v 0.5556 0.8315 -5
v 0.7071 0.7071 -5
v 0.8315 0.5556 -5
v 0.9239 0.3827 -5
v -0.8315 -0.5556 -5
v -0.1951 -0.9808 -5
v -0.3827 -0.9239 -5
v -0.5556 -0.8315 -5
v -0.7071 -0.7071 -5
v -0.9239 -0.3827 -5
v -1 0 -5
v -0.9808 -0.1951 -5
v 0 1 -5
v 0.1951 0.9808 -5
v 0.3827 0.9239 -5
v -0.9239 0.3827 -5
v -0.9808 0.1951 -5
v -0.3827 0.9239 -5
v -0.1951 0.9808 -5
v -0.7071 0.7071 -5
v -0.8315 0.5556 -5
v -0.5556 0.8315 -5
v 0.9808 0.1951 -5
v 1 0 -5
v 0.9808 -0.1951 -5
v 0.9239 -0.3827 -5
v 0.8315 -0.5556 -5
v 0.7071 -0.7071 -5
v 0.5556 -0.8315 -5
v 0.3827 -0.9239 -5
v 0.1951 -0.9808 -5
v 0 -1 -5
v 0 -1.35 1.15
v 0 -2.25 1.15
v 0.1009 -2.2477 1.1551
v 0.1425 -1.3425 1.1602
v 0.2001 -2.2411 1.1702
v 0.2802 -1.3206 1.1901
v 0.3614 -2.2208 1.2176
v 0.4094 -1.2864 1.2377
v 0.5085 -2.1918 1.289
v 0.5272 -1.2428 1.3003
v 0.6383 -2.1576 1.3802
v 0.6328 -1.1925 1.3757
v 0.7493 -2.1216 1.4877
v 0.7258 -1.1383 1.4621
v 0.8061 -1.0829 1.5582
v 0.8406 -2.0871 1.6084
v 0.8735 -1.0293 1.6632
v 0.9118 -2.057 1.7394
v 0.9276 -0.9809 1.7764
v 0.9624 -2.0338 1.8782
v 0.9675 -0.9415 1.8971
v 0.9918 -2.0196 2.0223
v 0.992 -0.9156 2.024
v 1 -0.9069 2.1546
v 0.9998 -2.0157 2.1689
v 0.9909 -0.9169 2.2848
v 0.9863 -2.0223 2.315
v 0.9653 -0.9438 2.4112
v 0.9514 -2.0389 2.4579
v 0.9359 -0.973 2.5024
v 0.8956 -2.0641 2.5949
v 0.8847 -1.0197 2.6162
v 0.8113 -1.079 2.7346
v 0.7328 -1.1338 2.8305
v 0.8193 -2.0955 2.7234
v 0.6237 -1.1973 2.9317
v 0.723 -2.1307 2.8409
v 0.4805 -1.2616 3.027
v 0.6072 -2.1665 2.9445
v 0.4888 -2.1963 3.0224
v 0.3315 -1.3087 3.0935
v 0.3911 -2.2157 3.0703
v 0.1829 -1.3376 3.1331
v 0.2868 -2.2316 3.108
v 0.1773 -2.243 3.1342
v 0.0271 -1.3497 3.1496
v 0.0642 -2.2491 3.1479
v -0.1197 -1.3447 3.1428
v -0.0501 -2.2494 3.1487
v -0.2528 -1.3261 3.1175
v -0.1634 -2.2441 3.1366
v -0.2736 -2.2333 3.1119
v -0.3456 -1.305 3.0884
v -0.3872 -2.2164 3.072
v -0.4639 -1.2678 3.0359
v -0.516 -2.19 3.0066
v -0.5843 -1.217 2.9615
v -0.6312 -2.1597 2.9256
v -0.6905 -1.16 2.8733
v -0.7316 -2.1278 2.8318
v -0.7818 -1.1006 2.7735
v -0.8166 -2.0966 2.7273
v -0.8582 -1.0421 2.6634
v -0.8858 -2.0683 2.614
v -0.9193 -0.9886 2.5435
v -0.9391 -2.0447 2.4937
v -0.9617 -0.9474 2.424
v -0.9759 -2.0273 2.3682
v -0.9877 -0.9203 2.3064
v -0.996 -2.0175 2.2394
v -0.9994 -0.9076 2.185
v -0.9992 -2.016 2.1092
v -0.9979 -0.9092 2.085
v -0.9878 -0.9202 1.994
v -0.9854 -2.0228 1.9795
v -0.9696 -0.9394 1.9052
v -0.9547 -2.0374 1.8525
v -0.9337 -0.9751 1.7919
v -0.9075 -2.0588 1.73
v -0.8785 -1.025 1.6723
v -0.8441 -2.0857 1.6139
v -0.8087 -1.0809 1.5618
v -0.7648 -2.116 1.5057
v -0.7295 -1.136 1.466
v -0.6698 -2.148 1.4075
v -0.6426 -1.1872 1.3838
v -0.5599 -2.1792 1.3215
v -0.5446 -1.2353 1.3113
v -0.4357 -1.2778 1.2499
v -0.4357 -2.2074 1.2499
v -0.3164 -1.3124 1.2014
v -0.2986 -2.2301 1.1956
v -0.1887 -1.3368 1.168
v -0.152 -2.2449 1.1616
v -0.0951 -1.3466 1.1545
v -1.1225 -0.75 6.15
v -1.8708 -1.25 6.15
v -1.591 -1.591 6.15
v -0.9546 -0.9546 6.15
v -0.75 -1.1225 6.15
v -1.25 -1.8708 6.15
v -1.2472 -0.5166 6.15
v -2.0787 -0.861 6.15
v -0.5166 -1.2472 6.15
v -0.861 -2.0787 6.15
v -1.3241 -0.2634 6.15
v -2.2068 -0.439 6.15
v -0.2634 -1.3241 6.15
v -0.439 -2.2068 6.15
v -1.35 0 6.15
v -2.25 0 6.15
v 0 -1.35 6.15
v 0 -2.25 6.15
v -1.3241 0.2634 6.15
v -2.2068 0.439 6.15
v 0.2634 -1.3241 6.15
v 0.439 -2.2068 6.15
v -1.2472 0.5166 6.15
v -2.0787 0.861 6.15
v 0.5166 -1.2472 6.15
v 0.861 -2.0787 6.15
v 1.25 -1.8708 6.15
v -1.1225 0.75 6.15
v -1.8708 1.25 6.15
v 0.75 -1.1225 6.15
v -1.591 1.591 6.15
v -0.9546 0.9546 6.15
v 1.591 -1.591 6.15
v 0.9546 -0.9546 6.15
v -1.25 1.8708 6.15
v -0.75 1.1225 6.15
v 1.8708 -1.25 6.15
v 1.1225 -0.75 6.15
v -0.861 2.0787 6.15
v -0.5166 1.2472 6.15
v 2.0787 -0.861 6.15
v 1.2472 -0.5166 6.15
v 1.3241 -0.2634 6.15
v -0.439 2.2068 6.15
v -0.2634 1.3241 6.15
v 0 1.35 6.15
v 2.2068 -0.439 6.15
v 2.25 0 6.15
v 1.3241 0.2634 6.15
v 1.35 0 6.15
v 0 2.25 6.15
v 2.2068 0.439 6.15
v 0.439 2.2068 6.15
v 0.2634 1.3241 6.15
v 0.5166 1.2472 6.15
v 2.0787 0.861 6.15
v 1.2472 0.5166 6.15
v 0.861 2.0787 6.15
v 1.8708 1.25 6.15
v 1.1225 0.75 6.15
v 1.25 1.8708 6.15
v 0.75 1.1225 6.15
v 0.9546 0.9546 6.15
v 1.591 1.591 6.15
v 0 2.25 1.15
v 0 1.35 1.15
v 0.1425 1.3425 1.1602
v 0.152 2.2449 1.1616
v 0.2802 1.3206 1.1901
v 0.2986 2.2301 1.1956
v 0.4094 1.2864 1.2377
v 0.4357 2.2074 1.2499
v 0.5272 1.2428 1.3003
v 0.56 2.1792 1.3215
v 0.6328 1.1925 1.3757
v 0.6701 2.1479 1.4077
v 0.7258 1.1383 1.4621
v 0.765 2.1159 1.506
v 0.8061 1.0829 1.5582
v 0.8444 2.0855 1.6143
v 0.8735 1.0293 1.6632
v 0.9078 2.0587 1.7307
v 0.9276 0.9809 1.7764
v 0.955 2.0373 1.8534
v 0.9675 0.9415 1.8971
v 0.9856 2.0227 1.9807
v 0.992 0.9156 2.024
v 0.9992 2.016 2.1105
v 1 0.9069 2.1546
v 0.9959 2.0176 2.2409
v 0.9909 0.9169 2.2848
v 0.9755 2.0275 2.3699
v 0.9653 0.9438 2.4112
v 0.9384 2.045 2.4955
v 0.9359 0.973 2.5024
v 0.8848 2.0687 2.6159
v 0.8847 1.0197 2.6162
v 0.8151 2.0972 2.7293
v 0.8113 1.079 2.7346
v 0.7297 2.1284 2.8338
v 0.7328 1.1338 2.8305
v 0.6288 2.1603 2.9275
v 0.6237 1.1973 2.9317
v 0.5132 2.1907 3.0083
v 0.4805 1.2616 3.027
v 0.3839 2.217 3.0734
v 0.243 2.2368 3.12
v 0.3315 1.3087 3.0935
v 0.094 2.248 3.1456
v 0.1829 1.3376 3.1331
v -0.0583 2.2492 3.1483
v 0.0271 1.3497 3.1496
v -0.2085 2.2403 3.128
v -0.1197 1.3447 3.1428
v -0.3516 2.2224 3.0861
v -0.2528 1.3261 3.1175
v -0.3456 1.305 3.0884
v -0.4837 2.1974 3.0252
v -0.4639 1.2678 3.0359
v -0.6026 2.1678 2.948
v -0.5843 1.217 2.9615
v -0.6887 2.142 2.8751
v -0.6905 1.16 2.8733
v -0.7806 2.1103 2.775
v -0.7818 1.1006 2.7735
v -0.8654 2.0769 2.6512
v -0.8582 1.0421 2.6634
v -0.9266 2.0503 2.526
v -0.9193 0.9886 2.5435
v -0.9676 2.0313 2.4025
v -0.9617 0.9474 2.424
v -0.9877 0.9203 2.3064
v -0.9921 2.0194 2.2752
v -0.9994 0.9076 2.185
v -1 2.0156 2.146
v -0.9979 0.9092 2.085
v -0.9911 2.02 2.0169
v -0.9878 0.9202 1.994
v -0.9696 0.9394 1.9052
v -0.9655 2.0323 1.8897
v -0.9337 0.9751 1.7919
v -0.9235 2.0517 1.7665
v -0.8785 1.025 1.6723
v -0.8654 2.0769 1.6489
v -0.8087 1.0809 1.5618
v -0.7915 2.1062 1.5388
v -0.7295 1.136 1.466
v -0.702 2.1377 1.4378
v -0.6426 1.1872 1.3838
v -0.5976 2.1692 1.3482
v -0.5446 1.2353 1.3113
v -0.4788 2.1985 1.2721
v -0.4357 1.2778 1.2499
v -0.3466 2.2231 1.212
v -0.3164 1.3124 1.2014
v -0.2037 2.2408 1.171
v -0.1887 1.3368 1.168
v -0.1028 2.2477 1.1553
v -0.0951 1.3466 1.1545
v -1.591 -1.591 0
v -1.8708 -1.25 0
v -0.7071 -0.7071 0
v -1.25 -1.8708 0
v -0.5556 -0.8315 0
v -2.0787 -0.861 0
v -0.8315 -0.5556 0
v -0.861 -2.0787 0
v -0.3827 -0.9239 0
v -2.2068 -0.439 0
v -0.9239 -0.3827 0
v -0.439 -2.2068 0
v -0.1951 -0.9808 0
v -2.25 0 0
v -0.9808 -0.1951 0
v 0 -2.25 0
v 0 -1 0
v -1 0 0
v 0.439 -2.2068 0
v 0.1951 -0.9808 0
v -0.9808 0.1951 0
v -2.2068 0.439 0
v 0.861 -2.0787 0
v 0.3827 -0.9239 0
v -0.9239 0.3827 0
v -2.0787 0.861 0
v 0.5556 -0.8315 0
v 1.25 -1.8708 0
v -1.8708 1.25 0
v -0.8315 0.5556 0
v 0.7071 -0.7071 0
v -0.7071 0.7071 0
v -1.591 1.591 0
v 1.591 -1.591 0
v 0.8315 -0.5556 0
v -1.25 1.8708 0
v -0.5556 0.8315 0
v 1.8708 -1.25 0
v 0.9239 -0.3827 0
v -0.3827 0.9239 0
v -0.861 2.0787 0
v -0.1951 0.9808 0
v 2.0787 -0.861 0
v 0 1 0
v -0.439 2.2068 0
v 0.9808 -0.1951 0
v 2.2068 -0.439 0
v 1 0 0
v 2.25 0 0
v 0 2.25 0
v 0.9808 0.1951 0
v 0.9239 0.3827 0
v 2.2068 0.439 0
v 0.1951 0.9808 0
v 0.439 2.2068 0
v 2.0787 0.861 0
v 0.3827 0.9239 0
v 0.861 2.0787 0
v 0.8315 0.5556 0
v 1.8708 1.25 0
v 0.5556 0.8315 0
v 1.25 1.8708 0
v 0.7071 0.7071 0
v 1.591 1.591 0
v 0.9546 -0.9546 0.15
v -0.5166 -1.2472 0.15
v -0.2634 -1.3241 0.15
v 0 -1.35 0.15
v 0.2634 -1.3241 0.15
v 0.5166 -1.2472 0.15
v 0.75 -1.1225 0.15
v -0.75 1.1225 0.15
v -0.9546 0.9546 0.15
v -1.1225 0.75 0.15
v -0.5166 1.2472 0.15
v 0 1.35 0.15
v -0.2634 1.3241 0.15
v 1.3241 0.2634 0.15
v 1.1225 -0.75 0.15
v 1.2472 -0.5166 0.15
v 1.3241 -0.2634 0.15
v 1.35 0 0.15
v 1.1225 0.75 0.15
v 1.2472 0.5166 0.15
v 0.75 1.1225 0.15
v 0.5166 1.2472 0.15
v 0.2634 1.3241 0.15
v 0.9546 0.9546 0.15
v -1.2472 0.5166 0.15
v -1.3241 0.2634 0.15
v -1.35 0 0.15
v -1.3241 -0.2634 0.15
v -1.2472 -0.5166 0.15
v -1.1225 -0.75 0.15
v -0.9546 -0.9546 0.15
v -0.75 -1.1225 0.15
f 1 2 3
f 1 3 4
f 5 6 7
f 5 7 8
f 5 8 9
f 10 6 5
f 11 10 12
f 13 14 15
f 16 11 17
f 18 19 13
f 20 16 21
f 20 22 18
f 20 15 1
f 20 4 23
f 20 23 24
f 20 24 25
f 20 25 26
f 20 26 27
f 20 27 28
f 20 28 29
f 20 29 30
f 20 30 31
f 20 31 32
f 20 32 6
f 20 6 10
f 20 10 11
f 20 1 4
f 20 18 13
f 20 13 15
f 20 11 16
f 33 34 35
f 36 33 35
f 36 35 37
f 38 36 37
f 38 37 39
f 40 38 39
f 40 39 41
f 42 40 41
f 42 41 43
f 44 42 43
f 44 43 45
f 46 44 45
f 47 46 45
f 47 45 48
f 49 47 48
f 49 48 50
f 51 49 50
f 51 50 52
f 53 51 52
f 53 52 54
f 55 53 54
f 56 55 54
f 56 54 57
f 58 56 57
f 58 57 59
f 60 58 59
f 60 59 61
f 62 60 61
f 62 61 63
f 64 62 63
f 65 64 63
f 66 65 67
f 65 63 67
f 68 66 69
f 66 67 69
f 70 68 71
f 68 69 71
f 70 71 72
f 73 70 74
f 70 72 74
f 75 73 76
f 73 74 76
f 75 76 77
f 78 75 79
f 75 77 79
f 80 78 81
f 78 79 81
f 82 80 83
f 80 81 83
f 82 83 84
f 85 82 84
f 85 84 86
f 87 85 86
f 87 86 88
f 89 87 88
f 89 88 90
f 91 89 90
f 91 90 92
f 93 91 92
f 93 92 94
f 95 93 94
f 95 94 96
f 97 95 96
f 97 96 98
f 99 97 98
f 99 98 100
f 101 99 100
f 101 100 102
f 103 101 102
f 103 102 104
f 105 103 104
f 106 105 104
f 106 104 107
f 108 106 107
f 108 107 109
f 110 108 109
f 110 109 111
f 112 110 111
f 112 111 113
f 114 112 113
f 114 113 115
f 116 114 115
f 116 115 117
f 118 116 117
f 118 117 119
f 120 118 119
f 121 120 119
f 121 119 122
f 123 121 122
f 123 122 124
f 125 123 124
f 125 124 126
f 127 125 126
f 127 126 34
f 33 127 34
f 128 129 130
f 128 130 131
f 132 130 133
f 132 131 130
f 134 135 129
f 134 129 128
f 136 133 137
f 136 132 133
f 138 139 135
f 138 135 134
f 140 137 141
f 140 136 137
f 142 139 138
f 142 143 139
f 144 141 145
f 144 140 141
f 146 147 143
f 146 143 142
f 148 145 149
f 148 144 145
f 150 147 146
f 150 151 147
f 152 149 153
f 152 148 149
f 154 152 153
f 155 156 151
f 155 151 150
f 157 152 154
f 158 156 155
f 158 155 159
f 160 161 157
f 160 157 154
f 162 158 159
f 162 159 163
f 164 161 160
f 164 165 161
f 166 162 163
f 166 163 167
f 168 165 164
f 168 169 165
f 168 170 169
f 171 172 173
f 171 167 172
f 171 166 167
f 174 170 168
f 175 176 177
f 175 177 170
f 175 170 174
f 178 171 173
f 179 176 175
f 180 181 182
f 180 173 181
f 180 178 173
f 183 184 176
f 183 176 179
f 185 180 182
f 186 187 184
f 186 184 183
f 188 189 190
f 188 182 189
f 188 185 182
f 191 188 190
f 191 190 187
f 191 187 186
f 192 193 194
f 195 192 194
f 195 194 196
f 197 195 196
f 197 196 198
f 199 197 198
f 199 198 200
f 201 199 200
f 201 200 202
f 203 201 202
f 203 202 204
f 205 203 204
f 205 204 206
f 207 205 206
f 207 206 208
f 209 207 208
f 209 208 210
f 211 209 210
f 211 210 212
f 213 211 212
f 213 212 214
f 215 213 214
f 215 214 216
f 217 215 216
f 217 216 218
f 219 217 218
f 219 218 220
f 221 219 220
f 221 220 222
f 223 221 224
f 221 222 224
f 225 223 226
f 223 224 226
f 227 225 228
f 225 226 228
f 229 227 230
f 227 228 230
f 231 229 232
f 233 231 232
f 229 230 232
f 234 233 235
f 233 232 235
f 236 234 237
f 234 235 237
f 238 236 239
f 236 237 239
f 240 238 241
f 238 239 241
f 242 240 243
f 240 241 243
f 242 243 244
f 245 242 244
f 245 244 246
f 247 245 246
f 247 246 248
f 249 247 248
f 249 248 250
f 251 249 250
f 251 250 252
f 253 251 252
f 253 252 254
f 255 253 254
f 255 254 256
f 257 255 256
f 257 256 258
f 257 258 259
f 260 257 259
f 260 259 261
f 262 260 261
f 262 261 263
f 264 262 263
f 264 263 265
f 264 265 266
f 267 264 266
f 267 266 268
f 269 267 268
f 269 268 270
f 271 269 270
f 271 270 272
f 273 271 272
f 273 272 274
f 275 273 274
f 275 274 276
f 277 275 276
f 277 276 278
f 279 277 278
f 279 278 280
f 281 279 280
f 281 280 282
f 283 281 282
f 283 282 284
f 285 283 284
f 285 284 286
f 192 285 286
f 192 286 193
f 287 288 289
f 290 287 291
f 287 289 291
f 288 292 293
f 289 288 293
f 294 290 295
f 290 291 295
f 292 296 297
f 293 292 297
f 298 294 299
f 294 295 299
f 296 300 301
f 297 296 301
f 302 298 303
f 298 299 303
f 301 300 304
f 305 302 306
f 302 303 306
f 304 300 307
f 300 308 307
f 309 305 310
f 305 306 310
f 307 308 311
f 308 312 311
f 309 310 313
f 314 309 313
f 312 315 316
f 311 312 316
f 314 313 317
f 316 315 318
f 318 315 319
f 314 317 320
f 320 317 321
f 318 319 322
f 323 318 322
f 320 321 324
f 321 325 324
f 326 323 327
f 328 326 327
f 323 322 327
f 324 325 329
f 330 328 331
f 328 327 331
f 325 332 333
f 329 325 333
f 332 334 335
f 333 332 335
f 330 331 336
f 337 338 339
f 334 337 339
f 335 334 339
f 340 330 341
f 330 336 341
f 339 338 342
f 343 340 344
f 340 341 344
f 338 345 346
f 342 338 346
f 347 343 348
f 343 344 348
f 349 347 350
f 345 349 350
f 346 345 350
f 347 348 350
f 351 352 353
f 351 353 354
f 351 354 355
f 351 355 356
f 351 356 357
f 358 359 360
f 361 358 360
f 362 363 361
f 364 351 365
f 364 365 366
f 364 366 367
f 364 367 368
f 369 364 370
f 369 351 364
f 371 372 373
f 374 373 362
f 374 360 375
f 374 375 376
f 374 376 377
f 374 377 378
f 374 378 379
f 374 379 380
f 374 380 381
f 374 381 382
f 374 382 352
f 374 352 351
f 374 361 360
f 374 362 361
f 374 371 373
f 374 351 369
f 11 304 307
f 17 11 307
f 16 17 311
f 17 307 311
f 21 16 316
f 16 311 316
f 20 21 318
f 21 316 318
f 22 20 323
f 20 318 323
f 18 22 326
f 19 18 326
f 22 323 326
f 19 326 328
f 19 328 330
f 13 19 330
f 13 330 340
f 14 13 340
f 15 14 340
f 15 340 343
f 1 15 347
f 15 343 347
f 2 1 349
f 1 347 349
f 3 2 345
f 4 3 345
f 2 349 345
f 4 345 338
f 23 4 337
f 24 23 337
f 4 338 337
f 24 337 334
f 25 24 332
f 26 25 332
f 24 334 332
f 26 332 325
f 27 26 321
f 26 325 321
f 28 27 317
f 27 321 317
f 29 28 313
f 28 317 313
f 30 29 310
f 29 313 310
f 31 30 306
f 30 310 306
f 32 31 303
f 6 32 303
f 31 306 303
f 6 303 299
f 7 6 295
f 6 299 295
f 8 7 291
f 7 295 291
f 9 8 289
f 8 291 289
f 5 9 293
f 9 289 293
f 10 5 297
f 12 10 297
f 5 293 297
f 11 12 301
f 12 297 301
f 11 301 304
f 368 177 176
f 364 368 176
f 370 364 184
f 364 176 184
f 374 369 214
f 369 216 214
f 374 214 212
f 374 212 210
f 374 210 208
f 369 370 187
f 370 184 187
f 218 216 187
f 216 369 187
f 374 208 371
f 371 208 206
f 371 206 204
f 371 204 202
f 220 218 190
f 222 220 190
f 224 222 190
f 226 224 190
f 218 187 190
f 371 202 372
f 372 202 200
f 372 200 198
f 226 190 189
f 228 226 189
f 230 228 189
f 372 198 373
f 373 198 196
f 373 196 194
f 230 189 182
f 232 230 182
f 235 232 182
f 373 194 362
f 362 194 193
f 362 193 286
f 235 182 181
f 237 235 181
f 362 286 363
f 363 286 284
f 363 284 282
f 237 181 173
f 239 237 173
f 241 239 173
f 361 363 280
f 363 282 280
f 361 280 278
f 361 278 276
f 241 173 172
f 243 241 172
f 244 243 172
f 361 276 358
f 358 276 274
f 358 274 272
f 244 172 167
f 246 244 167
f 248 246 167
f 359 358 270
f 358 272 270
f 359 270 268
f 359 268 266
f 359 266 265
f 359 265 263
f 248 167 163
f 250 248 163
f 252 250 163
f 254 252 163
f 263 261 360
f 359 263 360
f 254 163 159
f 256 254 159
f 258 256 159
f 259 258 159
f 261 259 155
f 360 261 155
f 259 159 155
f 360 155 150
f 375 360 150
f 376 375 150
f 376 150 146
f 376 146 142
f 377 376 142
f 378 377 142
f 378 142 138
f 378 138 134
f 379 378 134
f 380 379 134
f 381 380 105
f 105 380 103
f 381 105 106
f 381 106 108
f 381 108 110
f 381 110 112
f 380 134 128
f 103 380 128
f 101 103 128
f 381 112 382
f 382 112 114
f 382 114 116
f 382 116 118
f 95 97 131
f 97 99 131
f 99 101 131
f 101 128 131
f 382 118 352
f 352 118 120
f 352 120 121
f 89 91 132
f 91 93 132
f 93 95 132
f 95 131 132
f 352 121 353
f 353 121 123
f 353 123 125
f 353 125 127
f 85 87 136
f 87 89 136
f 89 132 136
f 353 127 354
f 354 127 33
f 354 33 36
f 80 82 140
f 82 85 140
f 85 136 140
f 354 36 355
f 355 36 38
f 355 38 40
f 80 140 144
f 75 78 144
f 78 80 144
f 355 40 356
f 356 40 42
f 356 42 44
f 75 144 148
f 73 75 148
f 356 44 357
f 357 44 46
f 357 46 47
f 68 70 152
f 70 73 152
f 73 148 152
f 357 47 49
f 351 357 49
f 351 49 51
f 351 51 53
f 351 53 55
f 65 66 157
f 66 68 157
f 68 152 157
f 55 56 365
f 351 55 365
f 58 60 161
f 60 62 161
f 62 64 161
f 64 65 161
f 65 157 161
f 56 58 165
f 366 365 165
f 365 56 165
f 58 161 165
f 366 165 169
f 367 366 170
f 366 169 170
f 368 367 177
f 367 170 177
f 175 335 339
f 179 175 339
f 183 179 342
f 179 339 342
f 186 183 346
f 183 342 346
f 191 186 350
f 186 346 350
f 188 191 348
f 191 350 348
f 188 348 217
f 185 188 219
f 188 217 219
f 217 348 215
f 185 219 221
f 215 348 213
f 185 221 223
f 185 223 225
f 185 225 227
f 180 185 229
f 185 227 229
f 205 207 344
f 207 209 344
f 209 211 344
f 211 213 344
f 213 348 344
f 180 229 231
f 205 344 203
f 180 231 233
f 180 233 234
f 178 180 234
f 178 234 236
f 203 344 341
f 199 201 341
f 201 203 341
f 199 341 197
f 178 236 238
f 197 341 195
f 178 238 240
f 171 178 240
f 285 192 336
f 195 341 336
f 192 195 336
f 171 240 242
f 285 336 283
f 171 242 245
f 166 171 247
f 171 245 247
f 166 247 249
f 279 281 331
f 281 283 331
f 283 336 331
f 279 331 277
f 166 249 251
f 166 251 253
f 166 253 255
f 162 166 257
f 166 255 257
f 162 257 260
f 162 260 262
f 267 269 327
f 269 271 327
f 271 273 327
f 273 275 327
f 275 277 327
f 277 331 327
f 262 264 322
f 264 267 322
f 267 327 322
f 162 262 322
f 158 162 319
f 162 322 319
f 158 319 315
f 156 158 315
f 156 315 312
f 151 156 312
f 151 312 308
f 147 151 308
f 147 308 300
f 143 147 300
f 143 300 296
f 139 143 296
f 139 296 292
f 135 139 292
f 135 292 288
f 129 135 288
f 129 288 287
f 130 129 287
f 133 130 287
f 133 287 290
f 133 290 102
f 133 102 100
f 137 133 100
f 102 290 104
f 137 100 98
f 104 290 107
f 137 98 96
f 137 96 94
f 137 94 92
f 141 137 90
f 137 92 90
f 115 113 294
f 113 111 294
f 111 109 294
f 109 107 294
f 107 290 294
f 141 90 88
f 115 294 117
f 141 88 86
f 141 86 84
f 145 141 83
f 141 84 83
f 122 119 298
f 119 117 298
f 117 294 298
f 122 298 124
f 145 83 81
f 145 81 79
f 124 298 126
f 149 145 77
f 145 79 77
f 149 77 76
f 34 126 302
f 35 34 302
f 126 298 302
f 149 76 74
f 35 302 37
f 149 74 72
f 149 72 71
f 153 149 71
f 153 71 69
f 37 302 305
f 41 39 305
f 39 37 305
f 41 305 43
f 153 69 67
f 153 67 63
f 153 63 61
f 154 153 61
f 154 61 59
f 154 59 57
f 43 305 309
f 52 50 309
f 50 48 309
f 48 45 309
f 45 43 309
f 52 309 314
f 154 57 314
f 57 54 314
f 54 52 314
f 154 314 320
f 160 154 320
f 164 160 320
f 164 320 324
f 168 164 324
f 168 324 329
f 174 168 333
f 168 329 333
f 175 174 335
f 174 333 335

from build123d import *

# Parameters (mm, degrees)
SKETCH1_R           = 2.25
BOSS_EXTRUDE1_DEPTH = 6.15
SKETCH2_R           = 1
BOSS_EXTRUDE2_DEPTH = 5
SKETCH3_R           = 1.35
CUT_EXTRUDE1_DEPTH  = 6
SKETCH4_R           = 1
CUT_EXTRUDE2_DEPTH  = 6


with BuildPart() as part:
    # Sketch1 → Boss-Extrude1 (new body)
    with BuildSketch(Plane.XY):
        Circle(SKETCH1_R)
    extrude(amount=BOSS_EXTRUDE1_DEPTH)

    # Sketch2 → Boss-Extrude2 (add)
    with BuildSketch(Plane(origin=(0, 0, 0), x_dir=(-1, 0, 0), z_dir=(0, 0, -1))):
        Circle(SKETCH2_R)
    extrude(amount=BOSS_EXTRUDE2_DEPTH)

    # Sketch3 → Cut-Extrude1 (cut)
    with BuildSketch(Plane.XY.offset(6.15)):
        Circle(SKETCH3_R)
    extrude(amount=-CUT_EXTRUDE1_DEPTH, mode=Mode.SUBTRACT)

    # Sketch4 → Cut-Extrude2 (cut)
    with BuildSketch(Plane(origin=(0, -2.25, 0), x_dir=(-1, 0, 0), z_dir=(0, -1, 0))):
        with Locations(Location((0, -2.15, 0), (0, 0, 90))):
            Circle(SKETCH4_R)
    extrude(amount=-CUT_EXTRUDE2_DEPTH, mode=Mode.SUBTRACT)


solid = part.part
